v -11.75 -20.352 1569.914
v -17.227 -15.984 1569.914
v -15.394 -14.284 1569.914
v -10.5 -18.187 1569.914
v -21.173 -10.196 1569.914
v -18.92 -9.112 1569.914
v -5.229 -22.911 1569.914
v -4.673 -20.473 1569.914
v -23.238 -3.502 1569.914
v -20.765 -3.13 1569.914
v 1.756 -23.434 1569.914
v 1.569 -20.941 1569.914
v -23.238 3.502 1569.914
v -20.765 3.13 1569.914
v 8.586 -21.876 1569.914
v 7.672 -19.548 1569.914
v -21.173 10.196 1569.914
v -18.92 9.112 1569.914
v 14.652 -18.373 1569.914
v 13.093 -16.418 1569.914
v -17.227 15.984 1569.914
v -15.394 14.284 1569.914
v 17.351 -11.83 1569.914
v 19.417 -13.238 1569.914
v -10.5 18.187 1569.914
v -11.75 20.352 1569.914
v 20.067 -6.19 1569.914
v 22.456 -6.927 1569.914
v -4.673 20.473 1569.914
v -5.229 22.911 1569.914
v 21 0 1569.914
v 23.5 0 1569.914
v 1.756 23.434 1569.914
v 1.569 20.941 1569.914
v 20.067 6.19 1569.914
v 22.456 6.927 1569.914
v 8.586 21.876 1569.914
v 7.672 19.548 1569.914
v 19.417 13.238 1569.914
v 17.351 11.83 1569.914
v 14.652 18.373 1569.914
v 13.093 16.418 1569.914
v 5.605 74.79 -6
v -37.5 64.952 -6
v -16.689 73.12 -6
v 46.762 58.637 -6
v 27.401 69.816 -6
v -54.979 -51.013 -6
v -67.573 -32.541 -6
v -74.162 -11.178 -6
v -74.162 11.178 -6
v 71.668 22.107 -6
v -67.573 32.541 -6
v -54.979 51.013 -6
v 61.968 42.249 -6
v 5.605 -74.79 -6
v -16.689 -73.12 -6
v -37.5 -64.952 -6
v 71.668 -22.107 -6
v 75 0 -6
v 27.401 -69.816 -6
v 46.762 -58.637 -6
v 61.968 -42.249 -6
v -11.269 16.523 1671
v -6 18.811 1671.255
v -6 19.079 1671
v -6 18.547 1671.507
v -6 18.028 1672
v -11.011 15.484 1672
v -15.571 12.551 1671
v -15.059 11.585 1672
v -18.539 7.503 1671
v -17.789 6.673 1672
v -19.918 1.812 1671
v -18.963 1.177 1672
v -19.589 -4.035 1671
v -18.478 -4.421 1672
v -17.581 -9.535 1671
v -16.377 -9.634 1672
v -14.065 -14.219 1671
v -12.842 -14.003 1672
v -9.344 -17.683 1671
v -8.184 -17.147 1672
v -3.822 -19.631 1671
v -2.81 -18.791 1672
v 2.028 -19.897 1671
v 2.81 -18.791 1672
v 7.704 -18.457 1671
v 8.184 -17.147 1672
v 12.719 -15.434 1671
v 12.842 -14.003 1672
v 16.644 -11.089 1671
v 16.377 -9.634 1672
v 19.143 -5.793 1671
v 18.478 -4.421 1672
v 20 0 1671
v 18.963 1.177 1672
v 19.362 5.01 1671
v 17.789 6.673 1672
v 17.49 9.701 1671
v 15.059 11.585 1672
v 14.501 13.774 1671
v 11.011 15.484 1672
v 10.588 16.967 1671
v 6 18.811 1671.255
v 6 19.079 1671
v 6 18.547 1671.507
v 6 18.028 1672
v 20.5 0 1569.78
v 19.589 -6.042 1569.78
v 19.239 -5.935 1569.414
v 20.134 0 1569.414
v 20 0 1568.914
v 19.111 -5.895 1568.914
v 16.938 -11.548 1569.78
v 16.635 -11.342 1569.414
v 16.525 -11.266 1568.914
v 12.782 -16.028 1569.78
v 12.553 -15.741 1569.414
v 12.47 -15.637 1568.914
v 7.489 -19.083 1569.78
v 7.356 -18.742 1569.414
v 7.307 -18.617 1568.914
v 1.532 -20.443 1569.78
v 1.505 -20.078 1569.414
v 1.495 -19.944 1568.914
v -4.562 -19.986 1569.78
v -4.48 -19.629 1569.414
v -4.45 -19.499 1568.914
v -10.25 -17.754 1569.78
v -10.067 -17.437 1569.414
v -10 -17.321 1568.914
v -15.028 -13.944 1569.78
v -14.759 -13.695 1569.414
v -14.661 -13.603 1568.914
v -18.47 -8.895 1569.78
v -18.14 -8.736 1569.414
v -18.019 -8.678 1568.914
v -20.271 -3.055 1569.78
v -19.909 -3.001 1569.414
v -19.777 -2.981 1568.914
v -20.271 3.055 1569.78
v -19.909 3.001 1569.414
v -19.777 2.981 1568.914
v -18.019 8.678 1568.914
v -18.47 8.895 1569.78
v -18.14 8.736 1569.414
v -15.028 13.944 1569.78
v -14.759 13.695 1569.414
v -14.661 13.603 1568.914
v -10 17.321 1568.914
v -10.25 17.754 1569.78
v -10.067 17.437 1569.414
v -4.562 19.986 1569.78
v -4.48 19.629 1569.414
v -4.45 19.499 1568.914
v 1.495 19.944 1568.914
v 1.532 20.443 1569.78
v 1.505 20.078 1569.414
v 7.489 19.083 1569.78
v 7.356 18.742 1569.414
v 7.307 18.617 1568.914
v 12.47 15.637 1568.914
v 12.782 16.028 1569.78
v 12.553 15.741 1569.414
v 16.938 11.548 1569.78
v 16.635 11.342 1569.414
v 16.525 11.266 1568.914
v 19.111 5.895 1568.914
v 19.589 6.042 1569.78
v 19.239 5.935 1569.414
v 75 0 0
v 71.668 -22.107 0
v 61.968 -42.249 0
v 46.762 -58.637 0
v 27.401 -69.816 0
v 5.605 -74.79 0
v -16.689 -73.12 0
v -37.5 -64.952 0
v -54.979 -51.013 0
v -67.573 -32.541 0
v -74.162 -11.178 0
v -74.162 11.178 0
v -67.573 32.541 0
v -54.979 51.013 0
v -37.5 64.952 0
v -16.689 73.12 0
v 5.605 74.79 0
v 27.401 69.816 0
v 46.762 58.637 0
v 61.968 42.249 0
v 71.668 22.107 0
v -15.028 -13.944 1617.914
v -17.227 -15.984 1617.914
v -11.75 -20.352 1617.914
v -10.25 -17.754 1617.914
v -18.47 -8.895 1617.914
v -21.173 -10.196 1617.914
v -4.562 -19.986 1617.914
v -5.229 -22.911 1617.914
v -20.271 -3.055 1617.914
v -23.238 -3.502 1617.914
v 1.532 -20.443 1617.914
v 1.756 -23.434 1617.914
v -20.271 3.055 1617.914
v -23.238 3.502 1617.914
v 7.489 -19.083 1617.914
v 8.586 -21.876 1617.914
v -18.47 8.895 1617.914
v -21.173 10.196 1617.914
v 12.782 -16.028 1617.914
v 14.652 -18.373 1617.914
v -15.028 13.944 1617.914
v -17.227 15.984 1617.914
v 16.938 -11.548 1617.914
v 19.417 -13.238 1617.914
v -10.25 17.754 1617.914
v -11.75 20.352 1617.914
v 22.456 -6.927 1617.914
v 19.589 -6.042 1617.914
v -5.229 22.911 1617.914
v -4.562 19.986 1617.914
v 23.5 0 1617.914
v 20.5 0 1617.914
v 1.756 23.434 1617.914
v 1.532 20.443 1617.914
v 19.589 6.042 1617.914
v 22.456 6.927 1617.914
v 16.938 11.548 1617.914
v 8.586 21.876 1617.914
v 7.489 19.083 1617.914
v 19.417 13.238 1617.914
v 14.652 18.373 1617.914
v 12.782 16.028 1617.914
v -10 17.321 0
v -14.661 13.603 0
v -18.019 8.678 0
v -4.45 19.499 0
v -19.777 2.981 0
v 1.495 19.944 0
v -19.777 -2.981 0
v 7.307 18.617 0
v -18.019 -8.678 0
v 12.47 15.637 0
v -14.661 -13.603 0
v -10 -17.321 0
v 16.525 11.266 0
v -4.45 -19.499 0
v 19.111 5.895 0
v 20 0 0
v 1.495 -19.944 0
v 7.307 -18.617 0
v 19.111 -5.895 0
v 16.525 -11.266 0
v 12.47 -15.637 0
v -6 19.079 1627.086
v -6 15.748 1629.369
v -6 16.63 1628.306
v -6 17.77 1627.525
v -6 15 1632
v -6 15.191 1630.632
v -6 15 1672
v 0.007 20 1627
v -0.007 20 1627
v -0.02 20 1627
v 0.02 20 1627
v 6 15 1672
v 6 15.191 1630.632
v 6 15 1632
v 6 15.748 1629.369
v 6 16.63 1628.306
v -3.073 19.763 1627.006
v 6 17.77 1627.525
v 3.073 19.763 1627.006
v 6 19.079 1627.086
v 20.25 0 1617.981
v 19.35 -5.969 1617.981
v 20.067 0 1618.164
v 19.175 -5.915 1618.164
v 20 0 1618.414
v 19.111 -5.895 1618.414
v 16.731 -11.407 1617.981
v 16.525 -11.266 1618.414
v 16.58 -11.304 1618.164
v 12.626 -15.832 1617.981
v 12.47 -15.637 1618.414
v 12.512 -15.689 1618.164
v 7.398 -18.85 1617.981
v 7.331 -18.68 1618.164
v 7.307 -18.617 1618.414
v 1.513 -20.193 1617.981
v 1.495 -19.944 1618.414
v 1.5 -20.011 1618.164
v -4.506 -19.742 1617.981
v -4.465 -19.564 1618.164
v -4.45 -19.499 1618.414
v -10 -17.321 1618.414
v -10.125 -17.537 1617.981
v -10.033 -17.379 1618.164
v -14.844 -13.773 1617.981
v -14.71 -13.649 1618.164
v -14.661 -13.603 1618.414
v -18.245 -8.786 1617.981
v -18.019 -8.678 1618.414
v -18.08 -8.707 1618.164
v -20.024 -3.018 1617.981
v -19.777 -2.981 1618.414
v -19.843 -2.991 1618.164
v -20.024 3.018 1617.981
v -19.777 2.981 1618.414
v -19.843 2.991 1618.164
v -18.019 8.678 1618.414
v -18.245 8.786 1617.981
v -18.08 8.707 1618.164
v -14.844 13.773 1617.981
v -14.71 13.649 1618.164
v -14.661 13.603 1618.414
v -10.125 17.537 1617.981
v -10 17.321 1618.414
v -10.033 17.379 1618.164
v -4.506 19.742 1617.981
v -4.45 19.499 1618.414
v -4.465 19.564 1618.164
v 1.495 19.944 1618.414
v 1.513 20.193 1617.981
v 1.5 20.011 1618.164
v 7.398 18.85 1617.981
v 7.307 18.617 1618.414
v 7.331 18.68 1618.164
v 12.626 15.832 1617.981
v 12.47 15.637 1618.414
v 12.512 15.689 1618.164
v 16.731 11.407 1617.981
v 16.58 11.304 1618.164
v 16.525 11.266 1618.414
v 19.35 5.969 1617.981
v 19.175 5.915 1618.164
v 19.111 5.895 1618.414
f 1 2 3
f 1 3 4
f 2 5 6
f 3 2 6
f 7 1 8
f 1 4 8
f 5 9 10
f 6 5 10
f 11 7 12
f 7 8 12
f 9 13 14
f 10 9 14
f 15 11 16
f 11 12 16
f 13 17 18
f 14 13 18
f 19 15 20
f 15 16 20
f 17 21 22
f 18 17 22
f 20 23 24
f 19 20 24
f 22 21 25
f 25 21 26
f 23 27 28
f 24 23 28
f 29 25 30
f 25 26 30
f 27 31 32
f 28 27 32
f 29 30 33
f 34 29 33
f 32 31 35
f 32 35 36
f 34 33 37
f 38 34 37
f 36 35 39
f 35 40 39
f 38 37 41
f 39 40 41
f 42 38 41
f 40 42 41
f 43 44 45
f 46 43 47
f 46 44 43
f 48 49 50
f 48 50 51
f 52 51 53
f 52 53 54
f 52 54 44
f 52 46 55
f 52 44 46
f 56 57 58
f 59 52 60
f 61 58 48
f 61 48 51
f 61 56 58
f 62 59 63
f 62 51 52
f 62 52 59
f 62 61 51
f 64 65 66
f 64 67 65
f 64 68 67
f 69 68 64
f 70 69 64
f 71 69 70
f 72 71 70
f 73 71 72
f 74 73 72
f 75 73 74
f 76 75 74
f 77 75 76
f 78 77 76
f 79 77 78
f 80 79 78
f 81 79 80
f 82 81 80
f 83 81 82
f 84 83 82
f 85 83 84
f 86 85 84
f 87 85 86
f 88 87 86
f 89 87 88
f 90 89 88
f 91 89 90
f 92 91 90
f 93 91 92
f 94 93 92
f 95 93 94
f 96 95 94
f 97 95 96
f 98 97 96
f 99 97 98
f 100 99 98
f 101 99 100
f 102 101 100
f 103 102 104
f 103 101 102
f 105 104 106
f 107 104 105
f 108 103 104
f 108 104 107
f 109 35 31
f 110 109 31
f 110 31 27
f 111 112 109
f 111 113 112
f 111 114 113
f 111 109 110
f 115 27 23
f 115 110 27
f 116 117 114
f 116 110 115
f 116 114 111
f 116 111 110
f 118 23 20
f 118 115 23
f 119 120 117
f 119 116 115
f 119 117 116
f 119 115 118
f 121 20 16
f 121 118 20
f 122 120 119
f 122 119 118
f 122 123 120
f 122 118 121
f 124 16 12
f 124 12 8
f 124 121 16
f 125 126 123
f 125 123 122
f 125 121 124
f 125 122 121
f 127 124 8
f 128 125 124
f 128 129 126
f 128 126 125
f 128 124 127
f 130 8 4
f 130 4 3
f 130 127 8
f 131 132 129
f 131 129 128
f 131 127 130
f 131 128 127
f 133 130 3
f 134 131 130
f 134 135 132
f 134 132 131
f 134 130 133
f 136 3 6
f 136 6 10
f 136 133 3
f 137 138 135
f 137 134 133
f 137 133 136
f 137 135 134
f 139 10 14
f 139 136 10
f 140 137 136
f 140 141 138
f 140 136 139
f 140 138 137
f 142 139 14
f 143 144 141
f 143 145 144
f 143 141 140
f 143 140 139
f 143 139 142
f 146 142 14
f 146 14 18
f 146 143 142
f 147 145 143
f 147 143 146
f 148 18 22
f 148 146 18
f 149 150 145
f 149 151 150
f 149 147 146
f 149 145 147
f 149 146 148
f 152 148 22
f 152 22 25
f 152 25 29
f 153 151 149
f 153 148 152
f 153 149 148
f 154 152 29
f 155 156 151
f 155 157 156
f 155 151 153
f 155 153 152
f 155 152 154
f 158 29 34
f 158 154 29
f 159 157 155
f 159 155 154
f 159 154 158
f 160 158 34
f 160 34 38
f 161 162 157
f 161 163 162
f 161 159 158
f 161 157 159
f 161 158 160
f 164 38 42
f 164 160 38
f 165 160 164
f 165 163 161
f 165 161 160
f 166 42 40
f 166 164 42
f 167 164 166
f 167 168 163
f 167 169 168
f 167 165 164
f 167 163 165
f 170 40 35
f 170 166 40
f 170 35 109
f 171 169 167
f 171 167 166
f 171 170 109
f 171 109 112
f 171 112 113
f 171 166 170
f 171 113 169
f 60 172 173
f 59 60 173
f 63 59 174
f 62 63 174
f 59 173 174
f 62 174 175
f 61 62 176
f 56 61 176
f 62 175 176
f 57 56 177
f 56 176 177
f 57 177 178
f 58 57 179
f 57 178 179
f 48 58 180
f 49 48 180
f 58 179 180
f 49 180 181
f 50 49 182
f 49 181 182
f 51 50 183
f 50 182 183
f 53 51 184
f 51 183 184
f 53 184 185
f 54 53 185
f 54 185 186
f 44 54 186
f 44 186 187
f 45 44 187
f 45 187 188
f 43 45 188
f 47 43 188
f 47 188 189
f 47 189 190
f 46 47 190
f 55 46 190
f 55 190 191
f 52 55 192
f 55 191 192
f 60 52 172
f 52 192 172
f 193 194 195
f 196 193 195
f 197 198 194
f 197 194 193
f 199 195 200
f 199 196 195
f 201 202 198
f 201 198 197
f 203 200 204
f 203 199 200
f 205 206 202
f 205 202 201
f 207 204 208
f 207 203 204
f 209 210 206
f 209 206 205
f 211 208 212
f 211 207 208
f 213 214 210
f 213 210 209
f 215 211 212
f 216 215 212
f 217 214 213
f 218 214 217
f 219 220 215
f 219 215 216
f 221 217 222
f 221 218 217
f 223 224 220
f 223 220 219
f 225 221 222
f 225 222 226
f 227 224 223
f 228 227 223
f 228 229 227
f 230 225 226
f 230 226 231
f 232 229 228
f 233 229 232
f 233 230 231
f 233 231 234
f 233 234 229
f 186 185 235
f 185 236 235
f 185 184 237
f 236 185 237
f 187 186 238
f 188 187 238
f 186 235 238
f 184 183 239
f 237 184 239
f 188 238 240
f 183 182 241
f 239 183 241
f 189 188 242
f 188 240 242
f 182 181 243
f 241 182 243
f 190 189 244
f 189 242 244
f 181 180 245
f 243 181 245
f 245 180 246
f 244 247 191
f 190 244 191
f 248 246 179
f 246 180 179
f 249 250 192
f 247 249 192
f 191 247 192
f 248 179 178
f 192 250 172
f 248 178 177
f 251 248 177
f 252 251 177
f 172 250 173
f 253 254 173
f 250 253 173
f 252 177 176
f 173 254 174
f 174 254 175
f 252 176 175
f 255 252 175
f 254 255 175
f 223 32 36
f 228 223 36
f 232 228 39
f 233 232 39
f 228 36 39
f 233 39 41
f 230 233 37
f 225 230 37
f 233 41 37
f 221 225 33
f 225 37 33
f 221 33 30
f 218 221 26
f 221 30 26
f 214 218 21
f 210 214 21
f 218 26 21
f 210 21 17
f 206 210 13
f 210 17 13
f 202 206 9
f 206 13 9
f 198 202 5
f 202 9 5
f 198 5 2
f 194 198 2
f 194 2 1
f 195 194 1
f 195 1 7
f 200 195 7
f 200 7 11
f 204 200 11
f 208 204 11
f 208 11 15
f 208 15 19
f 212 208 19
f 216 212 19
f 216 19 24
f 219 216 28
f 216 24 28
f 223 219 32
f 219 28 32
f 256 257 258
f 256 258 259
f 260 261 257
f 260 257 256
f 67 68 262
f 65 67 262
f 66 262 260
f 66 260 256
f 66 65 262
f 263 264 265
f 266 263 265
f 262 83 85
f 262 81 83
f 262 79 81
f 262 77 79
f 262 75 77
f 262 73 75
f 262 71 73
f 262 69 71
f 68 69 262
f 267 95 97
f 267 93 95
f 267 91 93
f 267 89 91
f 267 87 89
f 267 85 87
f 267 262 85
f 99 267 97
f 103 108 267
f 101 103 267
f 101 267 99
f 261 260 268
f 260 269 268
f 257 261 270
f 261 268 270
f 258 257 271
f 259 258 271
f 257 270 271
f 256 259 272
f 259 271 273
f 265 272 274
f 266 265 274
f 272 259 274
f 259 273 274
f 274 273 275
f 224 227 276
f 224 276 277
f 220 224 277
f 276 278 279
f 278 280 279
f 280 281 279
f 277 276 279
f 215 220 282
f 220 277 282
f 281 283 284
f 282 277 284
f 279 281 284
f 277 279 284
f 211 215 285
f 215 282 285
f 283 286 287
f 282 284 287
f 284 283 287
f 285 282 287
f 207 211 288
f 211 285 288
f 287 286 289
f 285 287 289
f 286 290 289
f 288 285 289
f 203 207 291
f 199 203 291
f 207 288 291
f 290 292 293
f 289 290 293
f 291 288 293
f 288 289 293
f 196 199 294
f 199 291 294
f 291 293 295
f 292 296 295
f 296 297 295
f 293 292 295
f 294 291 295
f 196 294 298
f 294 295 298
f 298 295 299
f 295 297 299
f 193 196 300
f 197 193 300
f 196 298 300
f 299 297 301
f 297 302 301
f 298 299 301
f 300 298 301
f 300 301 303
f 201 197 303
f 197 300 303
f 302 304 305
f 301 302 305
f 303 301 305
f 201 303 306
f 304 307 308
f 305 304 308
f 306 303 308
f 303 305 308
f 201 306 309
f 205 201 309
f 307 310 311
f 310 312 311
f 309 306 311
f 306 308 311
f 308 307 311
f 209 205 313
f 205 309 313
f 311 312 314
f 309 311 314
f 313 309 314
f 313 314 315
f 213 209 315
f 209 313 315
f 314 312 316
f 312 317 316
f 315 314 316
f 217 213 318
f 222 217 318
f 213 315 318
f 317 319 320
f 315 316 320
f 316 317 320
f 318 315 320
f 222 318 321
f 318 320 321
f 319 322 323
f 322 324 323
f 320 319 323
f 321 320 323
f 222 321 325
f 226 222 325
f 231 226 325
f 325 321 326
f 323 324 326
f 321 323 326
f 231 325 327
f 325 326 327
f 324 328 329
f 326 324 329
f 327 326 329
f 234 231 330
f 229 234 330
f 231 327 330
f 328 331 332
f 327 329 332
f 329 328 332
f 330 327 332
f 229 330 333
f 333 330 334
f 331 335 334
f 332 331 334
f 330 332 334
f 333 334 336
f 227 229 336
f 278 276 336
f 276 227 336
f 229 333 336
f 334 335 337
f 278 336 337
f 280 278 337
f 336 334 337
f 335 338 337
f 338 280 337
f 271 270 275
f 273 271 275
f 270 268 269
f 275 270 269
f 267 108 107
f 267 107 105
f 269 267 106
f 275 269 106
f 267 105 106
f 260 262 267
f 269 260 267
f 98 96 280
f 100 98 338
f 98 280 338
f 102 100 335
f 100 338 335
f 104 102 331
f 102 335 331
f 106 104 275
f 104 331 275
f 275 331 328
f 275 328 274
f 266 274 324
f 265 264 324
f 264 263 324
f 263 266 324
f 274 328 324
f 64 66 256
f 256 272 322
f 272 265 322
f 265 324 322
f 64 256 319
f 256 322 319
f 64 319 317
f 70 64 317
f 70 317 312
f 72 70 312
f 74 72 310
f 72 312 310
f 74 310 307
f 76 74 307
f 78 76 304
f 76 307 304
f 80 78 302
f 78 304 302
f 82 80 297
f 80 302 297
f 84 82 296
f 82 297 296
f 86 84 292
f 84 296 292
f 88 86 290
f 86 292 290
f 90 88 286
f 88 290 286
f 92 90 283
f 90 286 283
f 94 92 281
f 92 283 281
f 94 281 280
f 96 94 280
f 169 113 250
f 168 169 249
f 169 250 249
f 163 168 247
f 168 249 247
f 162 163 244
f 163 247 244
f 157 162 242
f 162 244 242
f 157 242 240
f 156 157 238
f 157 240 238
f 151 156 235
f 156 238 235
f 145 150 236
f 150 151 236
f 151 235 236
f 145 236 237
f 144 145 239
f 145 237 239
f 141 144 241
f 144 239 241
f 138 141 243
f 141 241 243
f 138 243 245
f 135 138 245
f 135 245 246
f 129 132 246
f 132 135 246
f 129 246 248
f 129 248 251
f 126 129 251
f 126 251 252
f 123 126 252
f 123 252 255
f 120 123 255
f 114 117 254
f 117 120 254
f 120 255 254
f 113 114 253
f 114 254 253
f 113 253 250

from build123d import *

# Parameters (mm, degrees)
F0_R      = 20
F1_DEPTH  = 1672
F2_R      = 75
F3_DEPTH  = 6
F5_R      = 23.5
F6_DEPTH  = 48
F7_R      = 0.5
F8_R      = 1
F9_W      = 12
F9_H      = 5
F10_DEPTH = 45
F11_R     = 4.99999
F12_SIZE2 = 1
F12_SIZE  = 1


# Not quite as in the source:
# - a fillet or chamfer is up to 0.001 mm smaller than in the source, because OpenCascade refuses the exact size


with BuildPart() as f1:
    # F0 (on Top) → F1 (new body)
    with BuildSketch(Plane.XY):
        Circle(F0_R)
    extrude(amount=F1_DEPTH)

    # F2 (on face) → F3 (join)
    with BuildSketch(Plane(origin=(0, 0, 0), x_dir=(1, 0, 0), z_dir=(0, 0, -1))):
        Circle(F2_R)
    extrude(amount=F3_DEPTH)

    # F5 (on offset) → F6 (join)
    with BuildSketch(Plane.XY.offset(1569.91401)):
        Circle(F5_R)
    extrude(amount=F6_DEPTH)

    # F7
    f7_edges = [f1.edges().sort_by_distance(p)[0] for p in [
        (-20, 0, 1617.91401),
    ]]
    fillet(f7_edges, radius=F7_R)

    # F8
    f8_edges = [f1.edges().sort_by_distance(p)[0] for p in [
        (-20, 0, 1569.91401),
    ]]
    fillet(f8_edges, radius=F8_R)

    # F9 (on face) → F10 (cut)
    with BuildSketch(Plane.XY.offset(1672)):
        with Locations((0, 17.5)):
            Rectangle(F9_W, F9_H)
    extrude(amount=-F10_DEPTH, mode=Mode.SUBTRACT)

    # F11 (radius 5 in the source; OpenCascade refuses exactly that, so slightly less here)
    f11_edges = [f1.edges().sort_by_distance(p)[0] for p in [
        (0, 15, 1627),
    ]]
    fillet(f11_edges, radius=F11_R)

    # F12
    f12_edges = [f1.edges().sort_by_distance(p)[0] for p in [
        (-11.83216, -16.124515, 1672),
    ]]
    chamfer(f12_edges, length=F12_SIZE, length2=F12_SIZE2)


solid = f1.part
